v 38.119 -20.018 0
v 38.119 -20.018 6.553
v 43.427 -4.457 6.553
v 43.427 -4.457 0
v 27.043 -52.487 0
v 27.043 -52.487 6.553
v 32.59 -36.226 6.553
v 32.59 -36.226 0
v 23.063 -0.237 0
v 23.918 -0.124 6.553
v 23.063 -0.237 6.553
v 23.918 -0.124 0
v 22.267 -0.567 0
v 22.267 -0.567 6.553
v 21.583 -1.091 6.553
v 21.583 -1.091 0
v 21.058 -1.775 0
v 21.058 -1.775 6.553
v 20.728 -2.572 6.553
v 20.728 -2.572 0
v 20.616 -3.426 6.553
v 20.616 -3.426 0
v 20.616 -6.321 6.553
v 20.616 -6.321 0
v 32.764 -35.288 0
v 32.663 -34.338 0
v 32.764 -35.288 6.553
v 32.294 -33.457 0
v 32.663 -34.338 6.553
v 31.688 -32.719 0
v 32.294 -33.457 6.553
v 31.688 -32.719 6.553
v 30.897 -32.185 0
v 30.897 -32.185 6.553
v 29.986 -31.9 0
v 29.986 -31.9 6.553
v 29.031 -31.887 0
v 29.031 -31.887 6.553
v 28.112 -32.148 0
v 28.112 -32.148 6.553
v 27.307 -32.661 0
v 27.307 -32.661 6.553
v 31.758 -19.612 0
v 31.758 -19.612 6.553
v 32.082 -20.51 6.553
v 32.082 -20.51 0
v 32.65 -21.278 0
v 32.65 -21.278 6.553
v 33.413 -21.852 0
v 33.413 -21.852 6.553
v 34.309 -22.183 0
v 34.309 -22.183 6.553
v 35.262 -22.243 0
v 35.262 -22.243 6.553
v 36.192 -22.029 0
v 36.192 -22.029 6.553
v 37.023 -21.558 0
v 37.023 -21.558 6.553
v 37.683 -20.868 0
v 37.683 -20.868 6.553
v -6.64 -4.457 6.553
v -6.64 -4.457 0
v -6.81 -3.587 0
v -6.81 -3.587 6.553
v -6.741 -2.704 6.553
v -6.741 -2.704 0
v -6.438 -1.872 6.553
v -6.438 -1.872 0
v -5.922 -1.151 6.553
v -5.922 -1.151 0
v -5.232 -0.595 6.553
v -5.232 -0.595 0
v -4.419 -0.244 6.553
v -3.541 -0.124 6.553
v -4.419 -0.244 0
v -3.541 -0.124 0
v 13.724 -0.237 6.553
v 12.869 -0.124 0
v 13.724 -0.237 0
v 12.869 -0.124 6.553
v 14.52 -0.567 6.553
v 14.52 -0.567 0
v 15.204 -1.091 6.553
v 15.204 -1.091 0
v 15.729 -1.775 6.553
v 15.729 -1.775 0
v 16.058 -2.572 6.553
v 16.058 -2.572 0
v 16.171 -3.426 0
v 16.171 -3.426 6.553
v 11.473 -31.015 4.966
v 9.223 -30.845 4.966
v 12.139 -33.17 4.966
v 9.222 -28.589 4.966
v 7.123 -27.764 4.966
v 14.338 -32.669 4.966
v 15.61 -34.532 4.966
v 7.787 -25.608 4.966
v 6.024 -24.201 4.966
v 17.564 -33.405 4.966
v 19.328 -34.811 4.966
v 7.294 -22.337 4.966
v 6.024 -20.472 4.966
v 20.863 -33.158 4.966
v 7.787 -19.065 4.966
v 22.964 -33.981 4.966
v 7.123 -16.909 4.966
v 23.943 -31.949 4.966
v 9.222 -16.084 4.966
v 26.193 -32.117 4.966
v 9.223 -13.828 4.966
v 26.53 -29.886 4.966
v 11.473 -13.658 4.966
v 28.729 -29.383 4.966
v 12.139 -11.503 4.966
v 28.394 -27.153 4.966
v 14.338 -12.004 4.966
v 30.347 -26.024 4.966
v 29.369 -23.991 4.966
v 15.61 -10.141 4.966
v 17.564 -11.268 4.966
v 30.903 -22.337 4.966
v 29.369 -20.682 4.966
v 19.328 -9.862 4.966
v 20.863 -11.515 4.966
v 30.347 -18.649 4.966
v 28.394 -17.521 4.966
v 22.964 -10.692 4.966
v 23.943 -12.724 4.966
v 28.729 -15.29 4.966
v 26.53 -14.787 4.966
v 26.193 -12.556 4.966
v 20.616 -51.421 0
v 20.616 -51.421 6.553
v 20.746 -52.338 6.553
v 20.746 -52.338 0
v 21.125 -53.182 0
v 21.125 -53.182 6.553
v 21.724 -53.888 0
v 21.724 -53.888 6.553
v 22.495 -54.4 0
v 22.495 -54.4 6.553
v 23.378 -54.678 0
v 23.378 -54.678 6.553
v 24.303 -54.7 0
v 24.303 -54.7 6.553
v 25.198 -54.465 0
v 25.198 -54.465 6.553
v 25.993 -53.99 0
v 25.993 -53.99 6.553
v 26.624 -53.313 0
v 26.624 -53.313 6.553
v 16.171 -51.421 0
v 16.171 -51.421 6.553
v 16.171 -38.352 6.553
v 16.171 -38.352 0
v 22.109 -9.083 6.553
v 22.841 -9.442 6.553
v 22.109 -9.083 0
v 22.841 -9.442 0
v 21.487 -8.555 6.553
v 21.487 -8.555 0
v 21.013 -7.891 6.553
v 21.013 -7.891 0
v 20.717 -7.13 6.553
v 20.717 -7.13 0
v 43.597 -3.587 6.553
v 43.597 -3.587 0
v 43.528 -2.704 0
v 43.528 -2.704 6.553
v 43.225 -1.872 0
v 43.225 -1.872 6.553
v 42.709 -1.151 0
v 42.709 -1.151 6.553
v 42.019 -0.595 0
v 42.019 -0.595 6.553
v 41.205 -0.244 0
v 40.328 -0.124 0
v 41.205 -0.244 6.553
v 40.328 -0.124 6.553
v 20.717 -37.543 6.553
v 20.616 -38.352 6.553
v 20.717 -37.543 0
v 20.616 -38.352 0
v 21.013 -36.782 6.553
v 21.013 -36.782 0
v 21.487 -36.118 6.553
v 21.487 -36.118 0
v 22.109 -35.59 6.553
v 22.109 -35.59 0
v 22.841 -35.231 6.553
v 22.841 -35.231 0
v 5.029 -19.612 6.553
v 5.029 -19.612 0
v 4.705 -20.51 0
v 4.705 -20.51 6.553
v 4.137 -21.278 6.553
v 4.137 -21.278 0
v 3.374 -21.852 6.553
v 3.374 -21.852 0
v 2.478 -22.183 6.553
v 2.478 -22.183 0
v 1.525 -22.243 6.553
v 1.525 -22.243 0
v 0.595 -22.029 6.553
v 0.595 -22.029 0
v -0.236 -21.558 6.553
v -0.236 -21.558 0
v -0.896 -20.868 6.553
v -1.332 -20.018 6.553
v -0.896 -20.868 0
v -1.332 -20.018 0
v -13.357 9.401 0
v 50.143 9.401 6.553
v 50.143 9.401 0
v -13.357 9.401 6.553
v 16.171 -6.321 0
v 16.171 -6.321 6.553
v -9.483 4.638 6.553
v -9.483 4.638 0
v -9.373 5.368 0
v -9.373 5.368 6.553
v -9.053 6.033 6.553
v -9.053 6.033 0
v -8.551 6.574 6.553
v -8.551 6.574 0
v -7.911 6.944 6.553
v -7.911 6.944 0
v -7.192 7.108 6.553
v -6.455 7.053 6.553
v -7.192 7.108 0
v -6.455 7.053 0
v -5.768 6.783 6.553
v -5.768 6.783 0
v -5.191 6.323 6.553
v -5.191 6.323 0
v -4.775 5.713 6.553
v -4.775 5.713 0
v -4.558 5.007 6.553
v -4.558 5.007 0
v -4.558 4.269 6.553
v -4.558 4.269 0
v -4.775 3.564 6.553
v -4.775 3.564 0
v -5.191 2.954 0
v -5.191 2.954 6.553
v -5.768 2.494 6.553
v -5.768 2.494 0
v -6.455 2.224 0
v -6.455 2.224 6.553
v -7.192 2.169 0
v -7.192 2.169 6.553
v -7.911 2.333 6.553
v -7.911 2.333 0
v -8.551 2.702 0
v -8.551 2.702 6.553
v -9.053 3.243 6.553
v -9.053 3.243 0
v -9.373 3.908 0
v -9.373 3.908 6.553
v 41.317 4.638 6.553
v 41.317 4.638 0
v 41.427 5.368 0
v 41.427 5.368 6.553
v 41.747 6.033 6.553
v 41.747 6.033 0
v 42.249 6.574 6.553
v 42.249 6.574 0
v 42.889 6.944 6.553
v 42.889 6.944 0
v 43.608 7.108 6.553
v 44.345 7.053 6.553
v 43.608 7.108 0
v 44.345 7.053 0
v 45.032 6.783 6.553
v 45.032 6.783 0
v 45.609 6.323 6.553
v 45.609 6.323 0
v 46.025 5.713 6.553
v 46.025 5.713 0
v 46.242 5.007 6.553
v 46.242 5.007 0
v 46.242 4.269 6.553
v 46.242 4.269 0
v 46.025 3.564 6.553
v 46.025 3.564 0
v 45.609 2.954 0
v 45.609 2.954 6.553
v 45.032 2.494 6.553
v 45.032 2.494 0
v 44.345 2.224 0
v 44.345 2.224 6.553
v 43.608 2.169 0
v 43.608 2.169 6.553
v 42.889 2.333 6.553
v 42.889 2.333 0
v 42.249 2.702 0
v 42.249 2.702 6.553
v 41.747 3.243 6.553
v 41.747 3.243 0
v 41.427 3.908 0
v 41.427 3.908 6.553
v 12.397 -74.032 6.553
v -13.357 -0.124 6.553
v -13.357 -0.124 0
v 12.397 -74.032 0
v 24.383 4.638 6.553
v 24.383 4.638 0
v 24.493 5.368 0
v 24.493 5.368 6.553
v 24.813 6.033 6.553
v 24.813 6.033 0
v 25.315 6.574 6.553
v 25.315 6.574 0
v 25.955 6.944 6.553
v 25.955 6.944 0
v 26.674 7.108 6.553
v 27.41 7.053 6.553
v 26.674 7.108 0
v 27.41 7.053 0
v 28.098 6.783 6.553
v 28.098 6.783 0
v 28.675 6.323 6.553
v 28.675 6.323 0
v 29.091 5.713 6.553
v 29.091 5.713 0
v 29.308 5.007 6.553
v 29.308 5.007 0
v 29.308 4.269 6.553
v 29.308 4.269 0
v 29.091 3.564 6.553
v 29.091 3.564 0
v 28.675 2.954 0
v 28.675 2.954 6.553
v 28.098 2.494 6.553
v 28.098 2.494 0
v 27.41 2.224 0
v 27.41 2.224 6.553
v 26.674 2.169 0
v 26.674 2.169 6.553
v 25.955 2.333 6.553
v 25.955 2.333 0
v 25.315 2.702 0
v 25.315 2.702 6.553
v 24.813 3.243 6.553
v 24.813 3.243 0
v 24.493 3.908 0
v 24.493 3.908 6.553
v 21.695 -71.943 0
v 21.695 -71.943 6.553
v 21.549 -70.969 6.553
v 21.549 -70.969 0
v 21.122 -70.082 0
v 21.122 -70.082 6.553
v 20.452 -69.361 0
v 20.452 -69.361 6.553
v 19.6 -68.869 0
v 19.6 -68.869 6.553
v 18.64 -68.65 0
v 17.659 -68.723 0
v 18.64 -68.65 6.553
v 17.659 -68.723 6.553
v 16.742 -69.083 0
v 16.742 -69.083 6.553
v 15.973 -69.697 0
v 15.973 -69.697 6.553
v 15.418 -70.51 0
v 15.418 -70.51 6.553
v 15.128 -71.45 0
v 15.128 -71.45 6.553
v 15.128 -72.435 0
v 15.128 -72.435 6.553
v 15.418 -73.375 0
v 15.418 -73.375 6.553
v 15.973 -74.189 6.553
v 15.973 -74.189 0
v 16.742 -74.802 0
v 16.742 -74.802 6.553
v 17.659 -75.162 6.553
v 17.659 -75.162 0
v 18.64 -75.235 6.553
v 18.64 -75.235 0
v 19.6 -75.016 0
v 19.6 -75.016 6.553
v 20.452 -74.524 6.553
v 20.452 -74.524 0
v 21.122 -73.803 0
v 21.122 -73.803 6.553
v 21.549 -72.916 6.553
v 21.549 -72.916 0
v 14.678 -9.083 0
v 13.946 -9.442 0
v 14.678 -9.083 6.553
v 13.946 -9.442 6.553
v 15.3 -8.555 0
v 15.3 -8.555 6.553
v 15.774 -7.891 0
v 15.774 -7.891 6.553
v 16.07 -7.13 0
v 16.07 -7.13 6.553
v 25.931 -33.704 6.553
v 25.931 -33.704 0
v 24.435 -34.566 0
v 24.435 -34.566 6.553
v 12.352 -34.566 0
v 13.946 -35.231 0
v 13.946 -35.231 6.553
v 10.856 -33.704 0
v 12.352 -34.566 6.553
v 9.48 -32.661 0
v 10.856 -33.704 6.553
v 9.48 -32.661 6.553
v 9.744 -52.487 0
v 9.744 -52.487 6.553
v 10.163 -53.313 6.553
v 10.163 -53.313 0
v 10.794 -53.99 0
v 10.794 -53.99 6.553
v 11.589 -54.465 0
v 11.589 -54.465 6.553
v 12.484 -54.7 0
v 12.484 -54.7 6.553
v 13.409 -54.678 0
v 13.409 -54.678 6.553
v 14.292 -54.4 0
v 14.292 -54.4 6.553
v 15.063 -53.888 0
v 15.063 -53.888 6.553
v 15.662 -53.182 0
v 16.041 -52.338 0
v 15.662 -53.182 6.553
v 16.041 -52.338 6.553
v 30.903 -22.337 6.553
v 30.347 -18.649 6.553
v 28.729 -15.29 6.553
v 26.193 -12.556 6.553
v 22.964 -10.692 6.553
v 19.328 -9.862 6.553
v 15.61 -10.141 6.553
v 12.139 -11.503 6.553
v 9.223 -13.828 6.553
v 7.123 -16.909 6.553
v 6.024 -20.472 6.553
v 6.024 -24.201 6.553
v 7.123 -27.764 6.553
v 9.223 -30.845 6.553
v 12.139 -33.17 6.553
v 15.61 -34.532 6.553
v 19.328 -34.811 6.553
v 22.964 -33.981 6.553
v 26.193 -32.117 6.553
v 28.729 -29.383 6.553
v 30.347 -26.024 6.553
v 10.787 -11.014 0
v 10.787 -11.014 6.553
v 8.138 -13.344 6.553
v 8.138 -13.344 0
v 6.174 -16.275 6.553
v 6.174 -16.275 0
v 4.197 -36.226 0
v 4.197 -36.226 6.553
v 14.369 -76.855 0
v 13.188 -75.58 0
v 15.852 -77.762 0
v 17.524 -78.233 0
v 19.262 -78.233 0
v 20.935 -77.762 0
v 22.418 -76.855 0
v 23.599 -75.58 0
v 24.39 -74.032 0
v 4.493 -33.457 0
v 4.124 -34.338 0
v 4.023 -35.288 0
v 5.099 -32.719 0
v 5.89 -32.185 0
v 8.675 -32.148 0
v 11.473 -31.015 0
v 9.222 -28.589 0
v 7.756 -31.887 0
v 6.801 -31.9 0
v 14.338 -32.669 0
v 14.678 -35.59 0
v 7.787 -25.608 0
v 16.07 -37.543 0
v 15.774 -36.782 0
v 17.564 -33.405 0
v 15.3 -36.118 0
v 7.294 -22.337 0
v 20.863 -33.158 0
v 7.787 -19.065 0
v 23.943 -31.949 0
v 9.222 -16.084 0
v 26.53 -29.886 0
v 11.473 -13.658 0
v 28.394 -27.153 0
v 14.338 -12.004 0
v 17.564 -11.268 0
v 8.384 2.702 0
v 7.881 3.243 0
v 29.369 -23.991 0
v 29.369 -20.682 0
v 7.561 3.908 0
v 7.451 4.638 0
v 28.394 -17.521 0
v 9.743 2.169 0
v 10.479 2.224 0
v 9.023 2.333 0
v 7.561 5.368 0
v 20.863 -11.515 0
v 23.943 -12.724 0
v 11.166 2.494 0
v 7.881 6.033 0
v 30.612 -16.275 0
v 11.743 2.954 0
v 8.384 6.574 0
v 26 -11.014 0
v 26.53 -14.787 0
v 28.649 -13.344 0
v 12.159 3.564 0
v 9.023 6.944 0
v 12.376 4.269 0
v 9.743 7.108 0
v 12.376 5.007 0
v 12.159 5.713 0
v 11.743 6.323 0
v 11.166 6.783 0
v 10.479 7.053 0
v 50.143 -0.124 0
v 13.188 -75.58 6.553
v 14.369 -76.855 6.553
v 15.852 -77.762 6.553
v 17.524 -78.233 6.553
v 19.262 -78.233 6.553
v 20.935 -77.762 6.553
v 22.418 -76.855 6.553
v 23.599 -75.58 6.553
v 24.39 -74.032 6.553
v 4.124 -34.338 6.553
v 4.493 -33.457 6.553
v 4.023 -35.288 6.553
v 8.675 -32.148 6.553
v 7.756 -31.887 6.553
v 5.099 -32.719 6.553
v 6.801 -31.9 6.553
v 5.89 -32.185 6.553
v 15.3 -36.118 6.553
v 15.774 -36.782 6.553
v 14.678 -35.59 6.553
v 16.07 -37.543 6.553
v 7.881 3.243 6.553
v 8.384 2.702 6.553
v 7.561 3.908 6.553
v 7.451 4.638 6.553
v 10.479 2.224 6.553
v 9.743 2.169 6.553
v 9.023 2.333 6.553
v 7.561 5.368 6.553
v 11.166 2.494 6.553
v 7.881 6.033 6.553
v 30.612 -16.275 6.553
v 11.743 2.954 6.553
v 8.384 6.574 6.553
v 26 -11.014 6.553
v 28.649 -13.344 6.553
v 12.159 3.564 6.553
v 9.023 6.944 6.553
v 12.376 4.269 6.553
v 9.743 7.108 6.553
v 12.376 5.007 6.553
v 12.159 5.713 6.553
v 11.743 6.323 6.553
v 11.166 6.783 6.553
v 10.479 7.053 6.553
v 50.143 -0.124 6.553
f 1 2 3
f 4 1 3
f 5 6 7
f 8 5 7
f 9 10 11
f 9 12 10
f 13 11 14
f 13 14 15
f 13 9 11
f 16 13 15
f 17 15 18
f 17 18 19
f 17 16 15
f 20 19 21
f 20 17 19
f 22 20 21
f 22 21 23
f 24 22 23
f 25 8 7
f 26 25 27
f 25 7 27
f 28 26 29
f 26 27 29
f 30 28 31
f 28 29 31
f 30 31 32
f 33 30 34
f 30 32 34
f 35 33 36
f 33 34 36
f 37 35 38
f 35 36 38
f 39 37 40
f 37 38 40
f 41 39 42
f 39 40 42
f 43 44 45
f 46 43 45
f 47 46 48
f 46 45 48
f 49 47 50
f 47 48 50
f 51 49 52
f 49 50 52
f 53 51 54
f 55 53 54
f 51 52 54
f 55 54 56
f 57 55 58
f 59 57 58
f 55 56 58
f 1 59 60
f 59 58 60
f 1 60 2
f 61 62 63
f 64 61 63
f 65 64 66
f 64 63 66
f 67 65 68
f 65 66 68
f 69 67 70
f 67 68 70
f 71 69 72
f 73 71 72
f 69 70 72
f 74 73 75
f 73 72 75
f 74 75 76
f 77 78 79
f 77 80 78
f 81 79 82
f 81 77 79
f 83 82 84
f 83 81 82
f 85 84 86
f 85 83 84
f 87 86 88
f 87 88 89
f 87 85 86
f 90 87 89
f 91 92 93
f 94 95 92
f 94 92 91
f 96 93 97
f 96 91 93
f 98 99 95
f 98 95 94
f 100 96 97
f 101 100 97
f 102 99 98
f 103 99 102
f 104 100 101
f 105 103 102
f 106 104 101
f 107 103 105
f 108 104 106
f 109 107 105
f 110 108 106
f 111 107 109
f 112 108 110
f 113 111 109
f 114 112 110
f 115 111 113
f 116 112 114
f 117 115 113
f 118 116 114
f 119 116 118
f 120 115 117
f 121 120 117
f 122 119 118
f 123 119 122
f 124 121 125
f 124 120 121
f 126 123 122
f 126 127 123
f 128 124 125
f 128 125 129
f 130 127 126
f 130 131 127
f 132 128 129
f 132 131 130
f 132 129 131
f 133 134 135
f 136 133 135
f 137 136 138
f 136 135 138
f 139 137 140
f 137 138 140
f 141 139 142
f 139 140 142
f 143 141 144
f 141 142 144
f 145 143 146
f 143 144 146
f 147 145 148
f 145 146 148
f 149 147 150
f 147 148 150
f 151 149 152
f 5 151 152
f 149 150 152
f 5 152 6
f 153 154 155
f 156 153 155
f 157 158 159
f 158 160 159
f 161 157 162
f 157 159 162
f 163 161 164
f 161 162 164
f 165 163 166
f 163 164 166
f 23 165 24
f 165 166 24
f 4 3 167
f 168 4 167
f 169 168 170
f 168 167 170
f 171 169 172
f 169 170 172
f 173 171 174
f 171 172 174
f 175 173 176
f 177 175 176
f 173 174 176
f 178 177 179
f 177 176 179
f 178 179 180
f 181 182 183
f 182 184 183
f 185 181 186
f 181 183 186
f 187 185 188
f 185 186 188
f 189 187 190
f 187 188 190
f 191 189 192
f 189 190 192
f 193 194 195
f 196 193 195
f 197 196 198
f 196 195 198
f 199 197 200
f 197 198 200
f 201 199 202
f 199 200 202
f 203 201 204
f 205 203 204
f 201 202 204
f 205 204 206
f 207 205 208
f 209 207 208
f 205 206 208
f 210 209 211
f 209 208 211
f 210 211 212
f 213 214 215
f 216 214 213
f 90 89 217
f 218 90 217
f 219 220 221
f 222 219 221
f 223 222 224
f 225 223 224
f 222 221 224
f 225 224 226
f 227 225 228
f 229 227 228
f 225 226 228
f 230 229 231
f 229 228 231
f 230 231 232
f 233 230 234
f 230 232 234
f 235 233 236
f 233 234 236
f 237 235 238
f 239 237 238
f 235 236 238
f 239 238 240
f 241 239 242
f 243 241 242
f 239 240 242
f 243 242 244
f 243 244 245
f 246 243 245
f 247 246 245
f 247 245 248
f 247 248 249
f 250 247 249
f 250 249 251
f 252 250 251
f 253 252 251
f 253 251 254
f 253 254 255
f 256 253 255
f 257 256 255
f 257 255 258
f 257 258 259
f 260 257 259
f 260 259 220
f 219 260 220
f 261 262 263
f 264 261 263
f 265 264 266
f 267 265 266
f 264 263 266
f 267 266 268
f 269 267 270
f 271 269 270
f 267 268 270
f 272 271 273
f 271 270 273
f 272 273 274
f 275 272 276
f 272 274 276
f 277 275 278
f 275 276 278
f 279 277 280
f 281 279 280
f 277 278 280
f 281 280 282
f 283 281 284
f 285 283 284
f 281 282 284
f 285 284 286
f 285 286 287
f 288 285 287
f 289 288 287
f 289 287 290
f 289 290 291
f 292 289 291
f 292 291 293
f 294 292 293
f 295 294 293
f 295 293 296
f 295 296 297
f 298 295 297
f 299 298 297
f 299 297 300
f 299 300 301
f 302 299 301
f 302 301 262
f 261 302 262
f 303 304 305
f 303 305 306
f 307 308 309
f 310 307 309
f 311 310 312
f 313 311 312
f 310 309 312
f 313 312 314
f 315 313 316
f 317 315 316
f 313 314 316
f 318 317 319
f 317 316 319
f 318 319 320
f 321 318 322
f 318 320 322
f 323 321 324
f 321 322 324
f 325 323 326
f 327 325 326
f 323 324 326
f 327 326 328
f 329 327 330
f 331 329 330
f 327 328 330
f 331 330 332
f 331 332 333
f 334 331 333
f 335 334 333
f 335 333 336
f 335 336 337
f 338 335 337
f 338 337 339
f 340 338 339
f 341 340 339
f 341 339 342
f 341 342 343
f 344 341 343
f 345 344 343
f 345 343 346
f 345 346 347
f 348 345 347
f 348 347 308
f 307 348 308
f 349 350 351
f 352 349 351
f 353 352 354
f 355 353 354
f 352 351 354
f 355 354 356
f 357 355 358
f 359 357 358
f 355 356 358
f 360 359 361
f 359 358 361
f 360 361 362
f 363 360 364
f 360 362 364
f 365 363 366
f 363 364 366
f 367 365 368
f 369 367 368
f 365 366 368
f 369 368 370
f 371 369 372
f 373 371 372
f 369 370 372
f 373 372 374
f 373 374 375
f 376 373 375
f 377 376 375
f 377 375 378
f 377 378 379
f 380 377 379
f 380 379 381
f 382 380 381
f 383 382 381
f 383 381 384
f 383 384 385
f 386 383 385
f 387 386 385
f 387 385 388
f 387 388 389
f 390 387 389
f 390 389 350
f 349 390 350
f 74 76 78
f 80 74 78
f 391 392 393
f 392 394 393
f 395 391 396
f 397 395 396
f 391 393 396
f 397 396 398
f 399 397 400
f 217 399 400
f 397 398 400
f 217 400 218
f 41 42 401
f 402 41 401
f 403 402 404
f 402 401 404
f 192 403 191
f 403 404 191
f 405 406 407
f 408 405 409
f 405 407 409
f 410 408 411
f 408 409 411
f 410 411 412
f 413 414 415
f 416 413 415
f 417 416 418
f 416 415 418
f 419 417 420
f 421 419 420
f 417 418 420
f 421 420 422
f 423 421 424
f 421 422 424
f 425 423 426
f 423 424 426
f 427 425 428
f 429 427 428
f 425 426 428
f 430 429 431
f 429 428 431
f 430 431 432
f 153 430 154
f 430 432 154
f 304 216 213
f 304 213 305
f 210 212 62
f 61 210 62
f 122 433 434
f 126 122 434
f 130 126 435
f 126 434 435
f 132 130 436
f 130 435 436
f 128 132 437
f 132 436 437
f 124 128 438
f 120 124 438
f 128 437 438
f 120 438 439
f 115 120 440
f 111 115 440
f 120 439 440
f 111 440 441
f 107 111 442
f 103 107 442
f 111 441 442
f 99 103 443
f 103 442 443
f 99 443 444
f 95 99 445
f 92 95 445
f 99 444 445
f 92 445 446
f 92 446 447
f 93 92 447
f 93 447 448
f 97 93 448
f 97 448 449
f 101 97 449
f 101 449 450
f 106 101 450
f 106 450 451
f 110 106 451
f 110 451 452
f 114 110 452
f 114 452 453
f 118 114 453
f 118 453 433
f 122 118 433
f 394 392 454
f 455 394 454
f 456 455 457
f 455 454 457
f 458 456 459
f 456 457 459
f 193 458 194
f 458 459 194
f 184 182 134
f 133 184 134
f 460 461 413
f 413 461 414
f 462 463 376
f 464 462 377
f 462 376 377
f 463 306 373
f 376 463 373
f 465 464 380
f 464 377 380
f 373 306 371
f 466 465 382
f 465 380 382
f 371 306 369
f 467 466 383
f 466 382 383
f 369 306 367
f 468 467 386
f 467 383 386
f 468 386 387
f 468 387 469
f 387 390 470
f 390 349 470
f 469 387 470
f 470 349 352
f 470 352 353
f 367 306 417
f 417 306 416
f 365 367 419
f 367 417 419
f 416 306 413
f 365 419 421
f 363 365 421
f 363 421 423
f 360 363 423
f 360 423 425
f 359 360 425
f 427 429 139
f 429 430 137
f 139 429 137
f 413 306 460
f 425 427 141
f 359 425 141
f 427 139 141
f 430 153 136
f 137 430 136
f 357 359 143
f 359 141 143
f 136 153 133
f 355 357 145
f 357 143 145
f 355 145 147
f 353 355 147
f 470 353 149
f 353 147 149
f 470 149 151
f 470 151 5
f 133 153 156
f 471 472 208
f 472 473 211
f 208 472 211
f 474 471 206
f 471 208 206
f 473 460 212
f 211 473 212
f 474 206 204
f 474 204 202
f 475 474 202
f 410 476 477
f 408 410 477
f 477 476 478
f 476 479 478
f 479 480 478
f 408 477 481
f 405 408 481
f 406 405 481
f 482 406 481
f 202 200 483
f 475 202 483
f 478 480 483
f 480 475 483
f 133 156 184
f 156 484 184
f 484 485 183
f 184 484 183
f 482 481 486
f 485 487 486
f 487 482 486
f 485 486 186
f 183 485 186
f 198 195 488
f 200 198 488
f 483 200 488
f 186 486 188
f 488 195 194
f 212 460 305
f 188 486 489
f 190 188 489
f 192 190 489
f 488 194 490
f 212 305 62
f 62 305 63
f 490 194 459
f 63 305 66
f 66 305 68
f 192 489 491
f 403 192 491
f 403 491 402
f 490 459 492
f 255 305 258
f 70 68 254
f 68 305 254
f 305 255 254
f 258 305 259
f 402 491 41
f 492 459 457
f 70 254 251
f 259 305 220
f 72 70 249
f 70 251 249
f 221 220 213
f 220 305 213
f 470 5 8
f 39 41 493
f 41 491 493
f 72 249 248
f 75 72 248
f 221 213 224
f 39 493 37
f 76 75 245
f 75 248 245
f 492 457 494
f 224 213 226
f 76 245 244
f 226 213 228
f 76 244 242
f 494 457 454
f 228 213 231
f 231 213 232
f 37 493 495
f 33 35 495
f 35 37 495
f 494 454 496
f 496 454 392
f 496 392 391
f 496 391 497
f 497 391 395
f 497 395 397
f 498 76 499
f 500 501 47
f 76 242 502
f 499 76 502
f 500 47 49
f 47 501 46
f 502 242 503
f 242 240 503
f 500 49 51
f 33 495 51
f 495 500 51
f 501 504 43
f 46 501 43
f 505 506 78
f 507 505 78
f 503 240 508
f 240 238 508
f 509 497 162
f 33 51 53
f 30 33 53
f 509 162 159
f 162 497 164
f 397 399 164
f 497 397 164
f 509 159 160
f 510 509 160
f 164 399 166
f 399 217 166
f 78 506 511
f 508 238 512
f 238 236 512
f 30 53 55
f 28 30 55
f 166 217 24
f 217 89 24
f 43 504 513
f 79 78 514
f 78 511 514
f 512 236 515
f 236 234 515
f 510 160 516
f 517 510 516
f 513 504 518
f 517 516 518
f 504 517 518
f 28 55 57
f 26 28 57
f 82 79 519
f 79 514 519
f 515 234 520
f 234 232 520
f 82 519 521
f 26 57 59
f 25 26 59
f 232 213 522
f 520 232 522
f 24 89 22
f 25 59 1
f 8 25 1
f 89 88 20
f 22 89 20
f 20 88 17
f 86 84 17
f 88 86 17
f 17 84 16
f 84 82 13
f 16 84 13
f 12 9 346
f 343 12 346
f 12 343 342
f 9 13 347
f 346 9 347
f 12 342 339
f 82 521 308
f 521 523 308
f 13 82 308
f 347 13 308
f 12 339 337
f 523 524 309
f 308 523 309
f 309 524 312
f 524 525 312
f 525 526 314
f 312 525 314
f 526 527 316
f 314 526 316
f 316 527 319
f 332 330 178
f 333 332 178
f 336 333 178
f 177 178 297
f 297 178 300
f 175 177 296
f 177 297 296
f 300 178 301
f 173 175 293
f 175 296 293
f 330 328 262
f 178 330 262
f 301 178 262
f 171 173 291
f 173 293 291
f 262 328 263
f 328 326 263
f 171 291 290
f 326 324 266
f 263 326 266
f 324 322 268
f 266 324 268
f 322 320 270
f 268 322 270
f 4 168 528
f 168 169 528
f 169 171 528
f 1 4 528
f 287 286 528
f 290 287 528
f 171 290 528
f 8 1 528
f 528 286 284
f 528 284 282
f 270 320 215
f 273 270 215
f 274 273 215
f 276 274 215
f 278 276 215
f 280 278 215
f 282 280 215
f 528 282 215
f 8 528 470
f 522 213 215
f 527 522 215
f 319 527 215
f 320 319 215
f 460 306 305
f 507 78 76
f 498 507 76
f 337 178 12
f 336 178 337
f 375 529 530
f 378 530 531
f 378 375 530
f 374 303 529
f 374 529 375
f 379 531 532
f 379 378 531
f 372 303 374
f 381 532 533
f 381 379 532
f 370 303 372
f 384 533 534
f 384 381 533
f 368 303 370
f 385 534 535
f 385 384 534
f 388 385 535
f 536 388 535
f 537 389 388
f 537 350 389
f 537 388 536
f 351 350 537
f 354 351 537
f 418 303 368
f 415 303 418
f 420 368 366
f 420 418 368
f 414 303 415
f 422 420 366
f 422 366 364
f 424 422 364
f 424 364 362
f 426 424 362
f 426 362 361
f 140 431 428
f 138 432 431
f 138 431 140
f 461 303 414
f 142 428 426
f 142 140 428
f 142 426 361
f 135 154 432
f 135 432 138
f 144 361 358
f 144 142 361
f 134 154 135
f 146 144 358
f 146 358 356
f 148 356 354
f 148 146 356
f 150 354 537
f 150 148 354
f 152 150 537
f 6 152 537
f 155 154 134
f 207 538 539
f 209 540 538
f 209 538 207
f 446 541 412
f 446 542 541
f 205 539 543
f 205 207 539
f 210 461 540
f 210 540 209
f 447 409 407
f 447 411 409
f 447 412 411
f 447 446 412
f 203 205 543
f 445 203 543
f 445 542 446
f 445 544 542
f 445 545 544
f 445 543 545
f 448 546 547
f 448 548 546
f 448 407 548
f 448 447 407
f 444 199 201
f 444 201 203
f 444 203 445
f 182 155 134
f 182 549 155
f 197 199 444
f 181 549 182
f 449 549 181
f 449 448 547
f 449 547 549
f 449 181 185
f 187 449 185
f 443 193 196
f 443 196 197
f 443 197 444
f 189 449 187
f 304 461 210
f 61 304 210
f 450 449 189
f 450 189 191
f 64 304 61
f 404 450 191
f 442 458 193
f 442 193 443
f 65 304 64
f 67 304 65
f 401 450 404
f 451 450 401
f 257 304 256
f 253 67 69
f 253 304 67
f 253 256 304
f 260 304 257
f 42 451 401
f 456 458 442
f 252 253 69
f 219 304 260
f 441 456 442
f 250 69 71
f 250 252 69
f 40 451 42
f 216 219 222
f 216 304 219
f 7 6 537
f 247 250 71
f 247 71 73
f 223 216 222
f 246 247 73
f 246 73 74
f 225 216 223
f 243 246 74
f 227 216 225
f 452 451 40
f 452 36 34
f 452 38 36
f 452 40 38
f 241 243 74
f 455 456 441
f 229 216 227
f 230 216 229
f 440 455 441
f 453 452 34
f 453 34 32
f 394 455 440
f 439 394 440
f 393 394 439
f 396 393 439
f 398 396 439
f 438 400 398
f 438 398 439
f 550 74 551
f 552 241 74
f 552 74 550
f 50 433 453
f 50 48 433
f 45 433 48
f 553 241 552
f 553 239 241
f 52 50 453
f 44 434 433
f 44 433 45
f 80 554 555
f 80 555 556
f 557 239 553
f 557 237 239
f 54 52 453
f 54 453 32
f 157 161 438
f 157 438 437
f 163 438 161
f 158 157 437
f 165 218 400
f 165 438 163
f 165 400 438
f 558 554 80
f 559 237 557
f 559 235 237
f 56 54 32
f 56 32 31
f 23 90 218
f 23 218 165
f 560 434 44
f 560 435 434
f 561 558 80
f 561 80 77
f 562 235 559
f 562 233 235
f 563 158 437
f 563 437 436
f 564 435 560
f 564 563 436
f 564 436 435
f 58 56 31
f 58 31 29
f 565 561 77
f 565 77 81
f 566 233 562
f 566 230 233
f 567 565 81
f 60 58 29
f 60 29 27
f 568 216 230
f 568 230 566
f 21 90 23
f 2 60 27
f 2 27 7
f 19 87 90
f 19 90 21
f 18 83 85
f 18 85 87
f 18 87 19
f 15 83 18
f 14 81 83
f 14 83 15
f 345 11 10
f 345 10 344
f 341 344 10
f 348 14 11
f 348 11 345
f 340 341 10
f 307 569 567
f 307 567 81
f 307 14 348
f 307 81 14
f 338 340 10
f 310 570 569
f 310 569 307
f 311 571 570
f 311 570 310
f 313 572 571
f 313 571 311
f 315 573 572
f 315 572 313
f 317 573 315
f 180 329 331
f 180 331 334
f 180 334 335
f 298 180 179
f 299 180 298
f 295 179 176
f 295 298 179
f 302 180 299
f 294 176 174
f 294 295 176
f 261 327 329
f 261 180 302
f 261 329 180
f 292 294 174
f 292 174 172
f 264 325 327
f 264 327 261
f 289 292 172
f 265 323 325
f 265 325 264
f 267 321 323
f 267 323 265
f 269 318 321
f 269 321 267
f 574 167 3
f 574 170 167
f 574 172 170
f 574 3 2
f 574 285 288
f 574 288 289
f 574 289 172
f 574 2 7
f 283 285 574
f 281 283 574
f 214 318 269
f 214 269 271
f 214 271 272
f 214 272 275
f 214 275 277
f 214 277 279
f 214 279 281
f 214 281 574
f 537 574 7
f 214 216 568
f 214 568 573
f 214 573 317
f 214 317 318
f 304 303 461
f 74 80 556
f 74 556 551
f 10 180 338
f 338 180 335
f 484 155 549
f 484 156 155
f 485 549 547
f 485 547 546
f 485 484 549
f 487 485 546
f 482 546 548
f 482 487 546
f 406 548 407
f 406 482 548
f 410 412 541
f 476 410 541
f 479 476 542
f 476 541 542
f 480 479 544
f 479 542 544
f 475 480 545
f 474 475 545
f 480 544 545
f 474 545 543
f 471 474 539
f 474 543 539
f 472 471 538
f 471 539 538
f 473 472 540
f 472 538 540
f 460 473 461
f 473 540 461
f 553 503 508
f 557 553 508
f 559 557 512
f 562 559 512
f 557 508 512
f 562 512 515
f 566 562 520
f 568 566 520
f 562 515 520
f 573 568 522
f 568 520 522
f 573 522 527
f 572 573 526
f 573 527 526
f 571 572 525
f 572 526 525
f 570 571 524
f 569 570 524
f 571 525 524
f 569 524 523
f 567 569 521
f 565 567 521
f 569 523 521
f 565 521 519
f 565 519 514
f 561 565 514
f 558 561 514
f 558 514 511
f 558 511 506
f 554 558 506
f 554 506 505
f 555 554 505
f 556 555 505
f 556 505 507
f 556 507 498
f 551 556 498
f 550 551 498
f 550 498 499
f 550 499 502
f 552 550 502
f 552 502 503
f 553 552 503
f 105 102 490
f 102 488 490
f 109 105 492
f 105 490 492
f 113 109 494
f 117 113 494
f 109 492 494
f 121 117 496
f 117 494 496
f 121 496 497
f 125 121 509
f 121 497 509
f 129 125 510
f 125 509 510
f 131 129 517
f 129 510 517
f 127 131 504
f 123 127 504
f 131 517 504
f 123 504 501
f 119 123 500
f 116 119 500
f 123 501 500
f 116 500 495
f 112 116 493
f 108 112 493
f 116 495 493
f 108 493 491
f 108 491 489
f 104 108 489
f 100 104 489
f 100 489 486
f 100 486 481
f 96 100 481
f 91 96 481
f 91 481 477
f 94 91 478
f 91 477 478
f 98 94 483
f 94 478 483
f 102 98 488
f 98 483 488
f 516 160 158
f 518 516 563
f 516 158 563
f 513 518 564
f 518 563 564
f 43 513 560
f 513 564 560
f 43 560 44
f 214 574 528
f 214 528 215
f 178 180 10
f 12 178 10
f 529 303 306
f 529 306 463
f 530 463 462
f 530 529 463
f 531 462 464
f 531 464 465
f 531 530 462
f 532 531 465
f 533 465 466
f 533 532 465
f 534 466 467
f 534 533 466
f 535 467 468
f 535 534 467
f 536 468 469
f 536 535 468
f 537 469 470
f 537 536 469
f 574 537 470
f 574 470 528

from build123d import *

# Parameters (mm, degrees)
BOSS_EXTRUDE1_DEPTH     = 6.5532
CUT_EXTRUDE1_DEPTH      = 94.204461666
CUT_EXTRUDE2_DEPTH      = 94.204461666
CUT_EXTRUDE3_DEPTH      = 94.204461666
CUT_EXTRUDE4_DEPTH      = 94.204461666
F_1_4_CLEARANCE_HOLE1_D = 6.604
HOLE1_D                 = 4.953
HOLE2_D                 = 22.1996
HOLE2_CBORE_D           = 25.019
HOLE2_CBORE_DEPTH       = 1.5875
FILLET1_R               = 3.302


with BuildPart() as part:
    # Sketch1 → Boss-Extrude1 (new body)
    with BuildSketch(Plane.XY.offset(6.5532)):
        with BuildLine():
            Line((24.389857327, -74.032249917), (50.14347414, -0.124279011))
            Line((50.14347414, -0.124279011), (50.14347414, 9.400720989))
            Line((50.14347414, 9.400720989), (-13.35652586, 9.400720989))
            Line((-13.35652586, 9.400720989), (-13.35652586, -0.124279011))
            Line((-13.35652586, -0.124279011), (12.397090952, -74.032249917))
            ThreePointArc((12.397090952, -74.032249917), (18.39347414, -78.292779011), (24.389857327, -74.032249917))
        make_face()
    extrude(amount=-BOSS_EXTRUDE1_DEPTH)

    # Sketch2 → Cut-Extrude1 (cut, through all)
    with BuildSketch(Plane.XY.offset(6.5532)):
        with BuildLine():
            Line((20.61597414, -35.794091329), (20.61597414, -51.420905267))
            ThreePointArc((20.61597414, -51.420905267), (23.377652776, -54.67839768), (27.043143627, -52.486982035))
            Line((27.043143627, -52.486982035), (32.590050314, -36.226404888))
            ThreePointArc((32.590050314, -36.226404888), (31.312054869, -32.423331215), (27.307035446, -32.660946735))
            ThreePointArc((27.307035446, -32.660946735), (24.177686628, -34.689191283), (20.61597414, -35.794091329))
        make_face()
    extrude(amount=-CUT_EXTRUDE1_DEPTH, mode=Mode.SUBTRACT)

    # Sketch3 → Cut-Extrude2 (cut, through all)
    with BuildSketch(Plane.XY.offset(6.5532)):
        with BuildLine():
            Line((16.17097414, -51.420905267), (16.17097414, -35.794091329))
            ThreePointArc((16.17097414, -35.794091329), (12.609261651, -34.689191283), (9.479912834, -32.660946735))
            ThreePointArc((9.479912834, -32.660946735), (5.47489341, -32.423331215), (4.196897965, -36.226404888))
            Line((4.196897965, -36.226404888), (9.743804652, -52.486982035))
            ThreePointArc((9.743804652, -52.486982035), (13.409295504, -54.67839768), (16.17097414, -51.420905267))
        make_face()
    extrude(amount=-CUT_EXTRUDE2_DEPTH, mode=Mode.SUBTRACT)

    # Sketch4 → Cut-Extrude3 (cut, through all)
    with BuildSketch(Plane.XY.offset(6.5532)):
        with BuildLine():
            Line((38.119000553, -20.018466488), (43.427416008, -4.457018658))
            ThreePointArc((43.427416008, -4.457018658), (42.991263585, -1.493779513), (40.327528698, -0.124279011))
            Line((40.327528698, -0.124279011), (20.61597414, -0.124279011))
            Line((20.61597414, -0.124279011), (20.61597414, -8.879066693))
            ThreePointArc((20.61597414, -8.879066693), (27.856065704, -12.512959264), (31.758379191, -19.611976838))
            ThreePointArc((31.758379191, -19.611976838), (34.783239019, -22.2476674), (38.119000553, -20.018466488))
        make_face()
    extrude(amount=-CUT_EXTRUDE3_DEPTH, mode=Mode.SUBTRACT)

    # Sketch5 → Cut-Extrude4 (cut, through all)
    with BuildSketch(Plane(origin=(0, 0, 0), x_dir=(-1, 0, 0), z_dir=(0, 0, -1))):
        with BuildLine():
            Line((1.332052274, -20.018466488), (6.640467729, -4.457018658))
            ThreePointArc((6.640467729, -4.457018658), (6.204315306, -1.493779513), (3.540580419, -0.124279011))
            Line((3.540580419, -0.124279011), (-16.17097414, -0.124279011))
            Line((-16.17097414, -0.124279011), (-16.17097414, -8.879066693))
            ThreePointArc((-16.17097414, -8.879066693), (-8.930882576, -12.512959264), (-5.028569088, -19.611976838))
            ThreePointArc((-5.028569088, -19.611976838), (-2.00370926, -22.2476674), (1.332052274, -20.018466488))
        make_face()
    extrude(amount=-CUT_EXTRUDE4_DEPTH, mode=Mode.SUBTRACT)

    # 1/4 Clearance Hole1 (through all)
    with Locations(Plane(origin=(0, 0, 0), x_dir=(-1, 0, 0), z_dir=(0, 0, -1))):
        with Locations((-18.39347414, -71.942579011)):
            Hole(F_1_4_CLEARANCE_HOLE1_D / 2)

    # Hole1 (through all)
    with Locations(Plane.XY.offset(6.5532)):
        with Locations((9.92765366, 4.638220989), (26.85929426, 4.638220989), (-7.00652586, 4.638220989), (43.79347426, 4.638220989)):
            Hole(HOLE1_D / 2)

    # Hole2 (through all)
    with Locations(Plane.XY.offset(6.5532)):
        with Locations((18.39347414, -22.336579011)):
            CounterBoreHole(HOLE2_D / 2, HOLE2_CBORE_D / 2, HOLE2_CBORE_DEPTH)

    # Fillet1
    fillet1_edges = [part.edges().sort_by_distance(p)[0] for p in [
        (20.61597414, -35.794091329, 3.2766),
        (16.17097414, -35.794091329, 3.2766),
        (20.61597414, -8.879066693, 3.2766),
        (20.61597414, -0.124279011, 3.2766),
        (16.17097414, -8.879066693, 3.2766),
        (16.17097414, -0.124279011, 3.2766),
    ]]
    fillet(fillet1_edges, radius=FILLET1_R)


solid = part.part
